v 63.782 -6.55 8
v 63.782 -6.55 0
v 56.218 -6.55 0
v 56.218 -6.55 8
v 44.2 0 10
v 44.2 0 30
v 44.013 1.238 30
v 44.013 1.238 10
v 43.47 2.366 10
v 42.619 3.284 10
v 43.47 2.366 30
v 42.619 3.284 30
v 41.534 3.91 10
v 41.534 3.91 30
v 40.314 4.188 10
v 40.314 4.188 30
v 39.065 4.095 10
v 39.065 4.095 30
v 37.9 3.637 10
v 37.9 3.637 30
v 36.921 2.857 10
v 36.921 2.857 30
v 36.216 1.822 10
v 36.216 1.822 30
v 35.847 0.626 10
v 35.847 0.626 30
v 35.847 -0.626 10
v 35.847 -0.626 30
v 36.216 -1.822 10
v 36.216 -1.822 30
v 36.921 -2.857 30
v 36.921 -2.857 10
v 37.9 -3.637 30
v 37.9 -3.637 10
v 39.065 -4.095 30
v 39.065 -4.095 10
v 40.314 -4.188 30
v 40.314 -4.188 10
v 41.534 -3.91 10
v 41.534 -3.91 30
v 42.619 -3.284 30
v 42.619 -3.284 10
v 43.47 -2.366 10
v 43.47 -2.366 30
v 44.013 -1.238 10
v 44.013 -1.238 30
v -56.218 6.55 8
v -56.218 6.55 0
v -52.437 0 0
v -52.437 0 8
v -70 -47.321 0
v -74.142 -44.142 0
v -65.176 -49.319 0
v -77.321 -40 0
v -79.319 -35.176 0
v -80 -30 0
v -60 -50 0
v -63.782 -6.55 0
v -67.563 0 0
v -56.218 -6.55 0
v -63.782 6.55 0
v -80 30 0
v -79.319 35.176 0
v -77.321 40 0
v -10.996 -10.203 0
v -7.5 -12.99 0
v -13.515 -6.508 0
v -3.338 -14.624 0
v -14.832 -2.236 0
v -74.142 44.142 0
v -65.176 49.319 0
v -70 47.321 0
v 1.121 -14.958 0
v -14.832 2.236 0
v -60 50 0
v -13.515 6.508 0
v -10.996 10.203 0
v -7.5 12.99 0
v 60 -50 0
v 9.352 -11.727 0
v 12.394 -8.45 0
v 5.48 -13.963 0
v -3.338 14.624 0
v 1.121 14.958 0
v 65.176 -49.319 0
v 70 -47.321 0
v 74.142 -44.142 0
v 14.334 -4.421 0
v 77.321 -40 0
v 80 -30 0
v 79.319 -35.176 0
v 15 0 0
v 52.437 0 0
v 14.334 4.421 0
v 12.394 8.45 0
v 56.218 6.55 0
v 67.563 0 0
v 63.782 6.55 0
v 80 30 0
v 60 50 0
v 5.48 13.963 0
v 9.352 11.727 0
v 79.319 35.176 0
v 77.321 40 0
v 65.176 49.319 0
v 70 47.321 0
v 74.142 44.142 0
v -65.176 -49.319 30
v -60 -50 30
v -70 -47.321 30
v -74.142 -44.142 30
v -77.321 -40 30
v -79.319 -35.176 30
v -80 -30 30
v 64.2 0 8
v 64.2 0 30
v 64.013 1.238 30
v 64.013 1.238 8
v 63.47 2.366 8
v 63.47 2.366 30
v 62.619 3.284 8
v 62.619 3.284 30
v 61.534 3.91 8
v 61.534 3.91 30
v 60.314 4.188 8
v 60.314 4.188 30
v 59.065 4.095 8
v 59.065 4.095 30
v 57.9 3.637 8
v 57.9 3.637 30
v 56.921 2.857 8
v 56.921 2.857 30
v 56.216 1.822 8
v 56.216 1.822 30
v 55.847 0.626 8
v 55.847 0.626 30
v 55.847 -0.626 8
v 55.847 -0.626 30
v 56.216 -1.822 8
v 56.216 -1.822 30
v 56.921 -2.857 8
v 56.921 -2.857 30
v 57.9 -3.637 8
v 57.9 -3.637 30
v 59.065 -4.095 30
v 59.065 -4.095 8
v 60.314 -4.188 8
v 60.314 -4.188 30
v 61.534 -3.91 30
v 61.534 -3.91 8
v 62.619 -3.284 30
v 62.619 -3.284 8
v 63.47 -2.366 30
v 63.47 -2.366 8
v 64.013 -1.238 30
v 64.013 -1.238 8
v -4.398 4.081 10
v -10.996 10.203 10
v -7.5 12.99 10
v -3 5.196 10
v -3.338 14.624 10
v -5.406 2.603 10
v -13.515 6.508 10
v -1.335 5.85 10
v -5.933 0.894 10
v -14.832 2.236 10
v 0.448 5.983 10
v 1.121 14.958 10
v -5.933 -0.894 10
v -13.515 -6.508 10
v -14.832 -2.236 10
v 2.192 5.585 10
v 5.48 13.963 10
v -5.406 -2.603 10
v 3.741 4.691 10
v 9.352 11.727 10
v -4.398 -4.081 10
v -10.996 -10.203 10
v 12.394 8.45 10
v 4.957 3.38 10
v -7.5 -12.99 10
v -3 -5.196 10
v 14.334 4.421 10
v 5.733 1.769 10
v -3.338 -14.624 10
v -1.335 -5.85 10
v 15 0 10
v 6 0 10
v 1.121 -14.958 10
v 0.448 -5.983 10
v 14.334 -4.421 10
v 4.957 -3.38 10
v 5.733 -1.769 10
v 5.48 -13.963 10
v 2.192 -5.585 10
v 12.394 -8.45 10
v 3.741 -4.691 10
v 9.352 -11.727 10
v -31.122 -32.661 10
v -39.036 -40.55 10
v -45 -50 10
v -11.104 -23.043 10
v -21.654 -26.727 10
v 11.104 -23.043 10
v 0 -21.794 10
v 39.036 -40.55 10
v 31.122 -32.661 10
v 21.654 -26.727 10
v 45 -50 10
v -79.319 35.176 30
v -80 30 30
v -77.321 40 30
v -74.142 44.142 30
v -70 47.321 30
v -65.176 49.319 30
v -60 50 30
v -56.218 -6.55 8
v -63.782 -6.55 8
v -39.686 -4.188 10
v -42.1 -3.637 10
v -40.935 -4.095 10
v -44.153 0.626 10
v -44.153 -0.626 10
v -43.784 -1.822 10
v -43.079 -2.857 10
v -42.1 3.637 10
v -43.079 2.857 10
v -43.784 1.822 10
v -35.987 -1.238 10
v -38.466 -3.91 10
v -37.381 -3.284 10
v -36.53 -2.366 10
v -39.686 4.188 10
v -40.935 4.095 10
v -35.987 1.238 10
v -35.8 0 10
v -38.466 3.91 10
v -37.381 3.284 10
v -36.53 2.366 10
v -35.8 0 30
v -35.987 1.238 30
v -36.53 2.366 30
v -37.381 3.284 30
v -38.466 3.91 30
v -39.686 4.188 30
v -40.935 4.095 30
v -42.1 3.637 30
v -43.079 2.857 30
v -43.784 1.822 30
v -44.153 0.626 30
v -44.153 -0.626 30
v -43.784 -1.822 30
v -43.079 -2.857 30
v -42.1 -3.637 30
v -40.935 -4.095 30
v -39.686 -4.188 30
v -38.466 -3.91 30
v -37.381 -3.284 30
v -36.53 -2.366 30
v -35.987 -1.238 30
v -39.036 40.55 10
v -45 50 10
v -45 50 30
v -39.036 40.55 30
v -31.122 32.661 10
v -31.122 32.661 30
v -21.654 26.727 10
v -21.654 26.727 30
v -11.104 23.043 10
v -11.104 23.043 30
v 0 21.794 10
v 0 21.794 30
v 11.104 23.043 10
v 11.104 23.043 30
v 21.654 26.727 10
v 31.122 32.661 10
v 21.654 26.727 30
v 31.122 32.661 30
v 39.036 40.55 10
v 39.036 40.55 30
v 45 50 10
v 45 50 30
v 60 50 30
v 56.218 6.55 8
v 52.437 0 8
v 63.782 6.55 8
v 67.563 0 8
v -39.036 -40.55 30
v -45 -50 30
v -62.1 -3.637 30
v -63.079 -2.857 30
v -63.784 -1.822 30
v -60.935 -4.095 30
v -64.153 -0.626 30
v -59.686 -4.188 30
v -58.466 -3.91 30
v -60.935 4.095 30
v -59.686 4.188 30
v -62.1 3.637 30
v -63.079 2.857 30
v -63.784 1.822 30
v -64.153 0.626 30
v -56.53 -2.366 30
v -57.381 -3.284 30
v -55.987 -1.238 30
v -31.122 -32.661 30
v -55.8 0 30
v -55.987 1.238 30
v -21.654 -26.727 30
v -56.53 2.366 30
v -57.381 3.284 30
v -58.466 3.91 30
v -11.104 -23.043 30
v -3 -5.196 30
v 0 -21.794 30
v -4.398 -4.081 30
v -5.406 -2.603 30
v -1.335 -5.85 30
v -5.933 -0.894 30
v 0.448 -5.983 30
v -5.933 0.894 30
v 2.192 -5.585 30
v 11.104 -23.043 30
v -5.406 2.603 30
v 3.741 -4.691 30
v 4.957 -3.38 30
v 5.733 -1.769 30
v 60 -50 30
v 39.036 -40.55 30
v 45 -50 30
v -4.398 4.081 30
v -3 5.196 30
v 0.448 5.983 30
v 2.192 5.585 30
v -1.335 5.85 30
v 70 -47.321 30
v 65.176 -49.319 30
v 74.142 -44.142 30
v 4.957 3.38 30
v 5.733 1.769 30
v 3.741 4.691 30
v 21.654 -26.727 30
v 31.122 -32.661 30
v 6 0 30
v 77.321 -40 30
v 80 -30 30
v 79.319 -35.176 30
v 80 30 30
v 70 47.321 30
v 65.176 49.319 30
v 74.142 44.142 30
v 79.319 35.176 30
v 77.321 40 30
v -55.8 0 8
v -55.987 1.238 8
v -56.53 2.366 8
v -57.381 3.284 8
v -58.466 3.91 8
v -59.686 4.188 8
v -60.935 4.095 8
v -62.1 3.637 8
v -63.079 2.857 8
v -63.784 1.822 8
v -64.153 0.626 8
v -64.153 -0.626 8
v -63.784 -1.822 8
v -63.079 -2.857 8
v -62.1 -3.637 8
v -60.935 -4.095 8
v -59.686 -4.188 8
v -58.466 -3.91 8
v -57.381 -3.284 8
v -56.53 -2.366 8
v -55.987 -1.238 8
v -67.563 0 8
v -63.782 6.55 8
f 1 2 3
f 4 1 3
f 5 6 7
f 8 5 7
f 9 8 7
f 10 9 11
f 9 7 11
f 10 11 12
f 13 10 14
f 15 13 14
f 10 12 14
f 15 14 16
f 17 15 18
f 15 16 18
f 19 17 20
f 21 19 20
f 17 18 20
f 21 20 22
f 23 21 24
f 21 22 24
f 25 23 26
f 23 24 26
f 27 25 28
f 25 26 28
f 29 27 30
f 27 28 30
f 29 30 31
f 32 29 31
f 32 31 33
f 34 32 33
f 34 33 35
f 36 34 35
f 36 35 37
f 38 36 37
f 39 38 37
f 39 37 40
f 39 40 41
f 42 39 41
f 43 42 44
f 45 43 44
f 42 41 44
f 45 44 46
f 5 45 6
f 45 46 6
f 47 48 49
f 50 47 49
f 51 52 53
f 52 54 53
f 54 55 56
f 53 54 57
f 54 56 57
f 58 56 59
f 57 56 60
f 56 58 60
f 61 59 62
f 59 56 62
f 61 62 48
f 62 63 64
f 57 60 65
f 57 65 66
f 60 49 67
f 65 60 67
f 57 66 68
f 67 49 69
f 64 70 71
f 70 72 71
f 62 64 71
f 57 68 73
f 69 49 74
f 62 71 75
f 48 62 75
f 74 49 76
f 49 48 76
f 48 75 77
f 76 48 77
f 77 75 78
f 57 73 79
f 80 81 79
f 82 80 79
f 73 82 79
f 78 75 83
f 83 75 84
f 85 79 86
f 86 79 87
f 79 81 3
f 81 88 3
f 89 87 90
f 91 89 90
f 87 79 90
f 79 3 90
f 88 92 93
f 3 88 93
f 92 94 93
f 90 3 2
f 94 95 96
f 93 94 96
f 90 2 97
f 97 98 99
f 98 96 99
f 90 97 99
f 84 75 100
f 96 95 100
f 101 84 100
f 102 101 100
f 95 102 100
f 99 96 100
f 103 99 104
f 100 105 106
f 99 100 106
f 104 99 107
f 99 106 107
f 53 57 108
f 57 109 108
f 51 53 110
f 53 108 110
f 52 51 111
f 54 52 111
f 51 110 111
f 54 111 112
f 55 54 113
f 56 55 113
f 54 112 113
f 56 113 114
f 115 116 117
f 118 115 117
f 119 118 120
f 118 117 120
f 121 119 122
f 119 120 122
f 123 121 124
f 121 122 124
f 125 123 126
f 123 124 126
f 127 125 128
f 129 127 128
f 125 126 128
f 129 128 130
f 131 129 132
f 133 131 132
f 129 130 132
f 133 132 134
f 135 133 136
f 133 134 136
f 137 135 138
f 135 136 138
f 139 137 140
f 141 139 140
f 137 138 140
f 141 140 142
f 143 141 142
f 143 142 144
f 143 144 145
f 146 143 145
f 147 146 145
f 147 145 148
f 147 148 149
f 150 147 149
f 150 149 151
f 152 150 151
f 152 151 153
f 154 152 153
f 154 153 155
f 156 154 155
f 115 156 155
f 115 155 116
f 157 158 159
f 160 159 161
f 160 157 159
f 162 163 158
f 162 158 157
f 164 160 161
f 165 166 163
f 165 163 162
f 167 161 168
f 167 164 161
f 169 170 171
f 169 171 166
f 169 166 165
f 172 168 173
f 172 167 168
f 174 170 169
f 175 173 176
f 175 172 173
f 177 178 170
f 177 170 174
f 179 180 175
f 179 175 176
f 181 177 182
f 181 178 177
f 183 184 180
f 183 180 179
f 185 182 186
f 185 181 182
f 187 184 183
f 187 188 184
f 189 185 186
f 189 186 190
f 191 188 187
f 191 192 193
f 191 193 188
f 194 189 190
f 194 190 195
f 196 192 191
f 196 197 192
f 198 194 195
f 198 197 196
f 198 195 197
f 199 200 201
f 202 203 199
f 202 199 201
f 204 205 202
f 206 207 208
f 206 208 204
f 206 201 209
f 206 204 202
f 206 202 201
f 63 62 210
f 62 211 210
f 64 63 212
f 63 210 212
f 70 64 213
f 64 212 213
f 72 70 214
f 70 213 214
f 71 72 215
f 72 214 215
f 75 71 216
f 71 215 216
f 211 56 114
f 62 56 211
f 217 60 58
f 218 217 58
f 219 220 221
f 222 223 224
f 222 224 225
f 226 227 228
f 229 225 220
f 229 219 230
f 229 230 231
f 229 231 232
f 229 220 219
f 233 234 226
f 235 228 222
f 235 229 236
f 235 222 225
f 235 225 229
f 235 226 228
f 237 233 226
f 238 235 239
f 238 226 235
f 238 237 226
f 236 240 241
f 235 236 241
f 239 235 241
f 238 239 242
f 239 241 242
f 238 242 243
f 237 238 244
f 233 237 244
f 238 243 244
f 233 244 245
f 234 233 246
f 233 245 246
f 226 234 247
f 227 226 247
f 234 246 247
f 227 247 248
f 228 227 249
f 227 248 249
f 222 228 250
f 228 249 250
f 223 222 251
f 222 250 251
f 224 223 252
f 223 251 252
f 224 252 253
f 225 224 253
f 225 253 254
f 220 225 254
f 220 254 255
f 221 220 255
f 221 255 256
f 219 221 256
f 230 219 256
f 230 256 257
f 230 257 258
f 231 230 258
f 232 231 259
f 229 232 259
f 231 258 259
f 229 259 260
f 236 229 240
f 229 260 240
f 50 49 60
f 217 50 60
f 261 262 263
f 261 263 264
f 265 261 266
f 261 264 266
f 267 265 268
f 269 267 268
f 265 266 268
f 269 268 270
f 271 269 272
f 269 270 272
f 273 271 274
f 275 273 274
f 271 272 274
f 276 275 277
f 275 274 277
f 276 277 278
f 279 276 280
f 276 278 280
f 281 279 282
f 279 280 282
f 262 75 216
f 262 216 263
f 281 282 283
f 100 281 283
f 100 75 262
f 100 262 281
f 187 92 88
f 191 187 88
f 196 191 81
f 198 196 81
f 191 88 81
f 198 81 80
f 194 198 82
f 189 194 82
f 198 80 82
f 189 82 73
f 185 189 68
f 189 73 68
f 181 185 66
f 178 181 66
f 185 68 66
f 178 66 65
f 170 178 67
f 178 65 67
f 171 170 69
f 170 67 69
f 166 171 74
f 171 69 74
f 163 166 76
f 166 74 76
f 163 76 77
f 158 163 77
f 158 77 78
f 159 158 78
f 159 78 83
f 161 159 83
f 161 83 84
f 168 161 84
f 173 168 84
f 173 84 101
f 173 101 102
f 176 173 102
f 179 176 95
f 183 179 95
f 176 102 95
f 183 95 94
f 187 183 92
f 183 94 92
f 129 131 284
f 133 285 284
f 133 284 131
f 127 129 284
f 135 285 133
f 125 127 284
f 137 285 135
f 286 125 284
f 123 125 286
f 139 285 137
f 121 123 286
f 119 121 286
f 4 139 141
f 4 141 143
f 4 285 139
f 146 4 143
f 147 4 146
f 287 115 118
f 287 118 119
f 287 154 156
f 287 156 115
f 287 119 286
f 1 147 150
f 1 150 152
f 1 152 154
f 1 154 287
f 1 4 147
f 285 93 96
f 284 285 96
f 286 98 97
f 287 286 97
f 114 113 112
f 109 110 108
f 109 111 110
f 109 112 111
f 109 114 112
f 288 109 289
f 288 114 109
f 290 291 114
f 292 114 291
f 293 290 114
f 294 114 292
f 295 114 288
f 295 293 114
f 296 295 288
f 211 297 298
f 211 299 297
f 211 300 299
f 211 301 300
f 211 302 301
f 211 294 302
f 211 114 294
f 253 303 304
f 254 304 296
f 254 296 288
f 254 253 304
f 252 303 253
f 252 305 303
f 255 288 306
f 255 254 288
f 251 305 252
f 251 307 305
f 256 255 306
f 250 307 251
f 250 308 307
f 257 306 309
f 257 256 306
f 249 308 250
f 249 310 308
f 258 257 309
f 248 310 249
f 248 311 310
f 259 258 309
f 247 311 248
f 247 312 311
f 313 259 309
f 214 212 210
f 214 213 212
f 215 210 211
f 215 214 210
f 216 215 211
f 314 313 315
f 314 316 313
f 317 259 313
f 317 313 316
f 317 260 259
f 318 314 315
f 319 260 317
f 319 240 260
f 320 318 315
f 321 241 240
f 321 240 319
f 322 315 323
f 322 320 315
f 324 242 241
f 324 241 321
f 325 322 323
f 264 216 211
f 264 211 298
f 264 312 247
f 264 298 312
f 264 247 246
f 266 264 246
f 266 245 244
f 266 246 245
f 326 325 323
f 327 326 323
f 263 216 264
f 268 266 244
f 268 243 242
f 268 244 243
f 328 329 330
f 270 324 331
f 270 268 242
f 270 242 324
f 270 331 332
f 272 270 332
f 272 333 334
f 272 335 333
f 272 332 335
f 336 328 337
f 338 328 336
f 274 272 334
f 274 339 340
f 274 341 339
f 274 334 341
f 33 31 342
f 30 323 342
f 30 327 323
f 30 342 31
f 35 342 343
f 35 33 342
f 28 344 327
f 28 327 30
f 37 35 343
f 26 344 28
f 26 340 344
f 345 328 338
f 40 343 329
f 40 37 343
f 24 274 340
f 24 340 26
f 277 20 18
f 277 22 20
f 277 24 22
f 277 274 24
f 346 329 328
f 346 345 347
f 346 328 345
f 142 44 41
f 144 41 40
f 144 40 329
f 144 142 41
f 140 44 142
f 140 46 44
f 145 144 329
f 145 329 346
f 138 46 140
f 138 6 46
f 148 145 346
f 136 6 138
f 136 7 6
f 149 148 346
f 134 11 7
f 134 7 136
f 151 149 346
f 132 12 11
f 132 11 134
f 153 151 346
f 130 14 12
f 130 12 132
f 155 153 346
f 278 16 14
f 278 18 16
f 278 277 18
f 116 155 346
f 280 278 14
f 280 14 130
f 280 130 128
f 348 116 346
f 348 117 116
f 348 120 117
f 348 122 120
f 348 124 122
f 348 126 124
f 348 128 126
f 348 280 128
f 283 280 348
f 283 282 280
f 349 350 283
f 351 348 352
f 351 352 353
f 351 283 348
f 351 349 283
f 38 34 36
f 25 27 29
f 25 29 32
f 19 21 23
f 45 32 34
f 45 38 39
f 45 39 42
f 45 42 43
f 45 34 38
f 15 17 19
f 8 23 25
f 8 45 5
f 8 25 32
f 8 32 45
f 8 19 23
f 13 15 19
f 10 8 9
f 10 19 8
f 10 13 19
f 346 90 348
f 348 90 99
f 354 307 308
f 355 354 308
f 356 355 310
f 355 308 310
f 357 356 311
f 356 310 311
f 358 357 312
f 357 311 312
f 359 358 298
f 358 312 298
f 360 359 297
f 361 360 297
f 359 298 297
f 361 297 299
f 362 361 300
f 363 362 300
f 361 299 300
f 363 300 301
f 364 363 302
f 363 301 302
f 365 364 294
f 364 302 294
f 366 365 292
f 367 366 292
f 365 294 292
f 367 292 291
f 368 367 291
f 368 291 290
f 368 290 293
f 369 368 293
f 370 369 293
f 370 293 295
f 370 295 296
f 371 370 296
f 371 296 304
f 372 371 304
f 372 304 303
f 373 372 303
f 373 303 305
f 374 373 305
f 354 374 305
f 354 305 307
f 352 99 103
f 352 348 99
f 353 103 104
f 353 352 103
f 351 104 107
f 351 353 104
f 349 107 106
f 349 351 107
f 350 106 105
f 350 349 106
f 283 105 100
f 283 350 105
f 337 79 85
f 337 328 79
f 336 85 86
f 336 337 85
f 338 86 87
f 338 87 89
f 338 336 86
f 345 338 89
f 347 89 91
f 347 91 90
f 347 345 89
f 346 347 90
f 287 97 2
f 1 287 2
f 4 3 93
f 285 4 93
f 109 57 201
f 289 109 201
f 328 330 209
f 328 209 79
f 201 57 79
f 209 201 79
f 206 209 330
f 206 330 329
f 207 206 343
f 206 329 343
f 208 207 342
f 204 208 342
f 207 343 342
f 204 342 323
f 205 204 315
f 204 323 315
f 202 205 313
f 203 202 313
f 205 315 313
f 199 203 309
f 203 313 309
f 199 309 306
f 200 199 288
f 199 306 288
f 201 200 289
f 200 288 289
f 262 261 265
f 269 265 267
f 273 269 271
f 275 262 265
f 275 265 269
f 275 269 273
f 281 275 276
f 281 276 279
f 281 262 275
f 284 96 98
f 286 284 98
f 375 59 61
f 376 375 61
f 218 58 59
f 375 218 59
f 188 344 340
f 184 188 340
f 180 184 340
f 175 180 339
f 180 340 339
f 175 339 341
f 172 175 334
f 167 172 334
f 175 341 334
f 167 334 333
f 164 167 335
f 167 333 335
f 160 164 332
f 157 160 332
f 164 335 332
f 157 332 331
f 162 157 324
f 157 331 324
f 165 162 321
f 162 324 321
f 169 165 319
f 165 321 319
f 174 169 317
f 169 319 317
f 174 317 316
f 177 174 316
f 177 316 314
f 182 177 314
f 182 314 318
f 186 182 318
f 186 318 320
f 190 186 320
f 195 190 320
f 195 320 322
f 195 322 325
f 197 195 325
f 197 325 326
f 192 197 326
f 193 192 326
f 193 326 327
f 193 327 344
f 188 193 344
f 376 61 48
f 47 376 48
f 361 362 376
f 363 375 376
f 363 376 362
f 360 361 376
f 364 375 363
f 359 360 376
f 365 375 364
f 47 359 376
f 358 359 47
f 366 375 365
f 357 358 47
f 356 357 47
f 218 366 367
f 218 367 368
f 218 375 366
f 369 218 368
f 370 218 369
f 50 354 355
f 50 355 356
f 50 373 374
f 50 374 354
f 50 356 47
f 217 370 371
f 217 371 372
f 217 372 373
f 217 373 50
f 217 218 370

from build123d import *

# Parameters (mm, degrees)
SKETCH_W        = 160
SKETCH_H        = 100
PAD_DEPTH       = 30
SKETCH001_R     = 6
SKETCH001_R_2   = 4.2
POCKET_DEPTH    = 30
POCKET001_DEPTH = 8
SKETCH003_R     = 15
POCKET002_DEPTH = 10
FILLET_R        = 20
POCKET003_DEPTH = 20
FILLET001_R     = 20
FILLET002_R     = 20
FILLET003_R     = 20
SKETCH006_R     = 4.2
POCKET004_DEPTH = 20


with BuildPart() as part:
    # Sketch → Pad (new body)
    with BuildSketch(Plane.XY):
        Rectangle(SKETCH_W, SKETCH_H)
    extrude(amount=PAD_DEPTH)

    # Sketch001 (on Face6 of Pad) → Pocket (cut)
    with BuildSketch(Plane.XY.offset(30)):
        Circle(SKETCH001_R)
        with Locations((60, 0)):
            Circle(SKETCH001_R_2)
        with Locations((-60, 0)):
            Circle(SKETCH001_R_2)
    extrude(amount=-POCKET_DEPTH, mode=Mode.SUBTRACT)

    # Sketch002 (on Face4 of Pocket) → Pocket001 (cut)
    with BuildSketch(Plane(origin=(0, 0, 0), x_dir=(1, 0, 0), z_dir=(0, 0, -1))):
        Polygon((-52.436711, 0), (-56.218356, 6.55), (-63.781644, 6.55), (-67.563289, 0), (-63.781644, -6.55), (-56.218356, -6.55), align=None)
        Polygon((67.563289, 0), (63.781644, 6.55), (56.218356, 6.55), (52.436711, 0), (56.218356, -6.55), (63.781644, -6.55), align=None)
    extrude(amount=-POCKET001_DEPTH, mode=Mode.SUBTRACT)

    # Sketch003 (on Face4 of Pocket001) → Pocket002 (cut)
    with BuildSketch(Plane(origin=(0, 0, 0), x_dir=(1, 0, 0), z_dir=(0, 0, -1))):
        Circle(SKETCH003_R)
    extrude(amount=-POCKET002_DEPTH, mode=Mode.SUBTRACT)

    # Fillet
    fillet_edges = [part.edges().sort_by_distance(p)[0] for p in [
        (-80, 50, 15),
    ]]
    fillet(fillet_edges, radius=FILLET_R)

    # Sketch004 → Pocket003 (cut)
    with BuildSketch(Plane.XY.offset(30)):
        with BuildLine():
            ThreePointArc((-45, 50), (0, 21.794495), (45, 50))
            Line((-45, 50), (45, 50))
        make_face()
        with BuildLine():
            ThreePointArc((45, -50), (0, -21.794495), (-45, -50))
            Line((-45, -50), (45, -50))
        make_face()
    extrude(amount=-POCKET003_DEPTH, mode=Mode.SUBTRACT)

    # Fillet001
    fillet001_edges = [part.edges().sort_by_distance(p)[0] for p in [
        (80, -50, 15),
    ]]
    fillet(fillet001_edges, radius=FILLET001_R)

    # Fillet002
    fillet002_edges = [part.edges().sort_by_distance(p)[0] for p in [
        (80, 50, 15),
    ]]
    fillet(fillet002_edges, radius=FILLET002_R)

    # Fillet003
    fillet003_edges = [part.edges().sort_by_distance(p)[0] for p in [
        (-80, -50, 15),
    ]]
    fillet(fillet003_edges, radius=FILLET003_R)

    # Sketch006 (on Face23 of Fillet003) → Pocket004 (cut)
    with BuildSketch(Plane.XY.offset(30)):
        with Locations((-40, 0)):
            Circle(SKETCH006_R)
        with Locations((40, 0)):
            Circle(SKETCH006_R)
    extrude(amount=-POCKET004_DEPTH, mode=Mode.SUBTRACT)


solid = part.part
